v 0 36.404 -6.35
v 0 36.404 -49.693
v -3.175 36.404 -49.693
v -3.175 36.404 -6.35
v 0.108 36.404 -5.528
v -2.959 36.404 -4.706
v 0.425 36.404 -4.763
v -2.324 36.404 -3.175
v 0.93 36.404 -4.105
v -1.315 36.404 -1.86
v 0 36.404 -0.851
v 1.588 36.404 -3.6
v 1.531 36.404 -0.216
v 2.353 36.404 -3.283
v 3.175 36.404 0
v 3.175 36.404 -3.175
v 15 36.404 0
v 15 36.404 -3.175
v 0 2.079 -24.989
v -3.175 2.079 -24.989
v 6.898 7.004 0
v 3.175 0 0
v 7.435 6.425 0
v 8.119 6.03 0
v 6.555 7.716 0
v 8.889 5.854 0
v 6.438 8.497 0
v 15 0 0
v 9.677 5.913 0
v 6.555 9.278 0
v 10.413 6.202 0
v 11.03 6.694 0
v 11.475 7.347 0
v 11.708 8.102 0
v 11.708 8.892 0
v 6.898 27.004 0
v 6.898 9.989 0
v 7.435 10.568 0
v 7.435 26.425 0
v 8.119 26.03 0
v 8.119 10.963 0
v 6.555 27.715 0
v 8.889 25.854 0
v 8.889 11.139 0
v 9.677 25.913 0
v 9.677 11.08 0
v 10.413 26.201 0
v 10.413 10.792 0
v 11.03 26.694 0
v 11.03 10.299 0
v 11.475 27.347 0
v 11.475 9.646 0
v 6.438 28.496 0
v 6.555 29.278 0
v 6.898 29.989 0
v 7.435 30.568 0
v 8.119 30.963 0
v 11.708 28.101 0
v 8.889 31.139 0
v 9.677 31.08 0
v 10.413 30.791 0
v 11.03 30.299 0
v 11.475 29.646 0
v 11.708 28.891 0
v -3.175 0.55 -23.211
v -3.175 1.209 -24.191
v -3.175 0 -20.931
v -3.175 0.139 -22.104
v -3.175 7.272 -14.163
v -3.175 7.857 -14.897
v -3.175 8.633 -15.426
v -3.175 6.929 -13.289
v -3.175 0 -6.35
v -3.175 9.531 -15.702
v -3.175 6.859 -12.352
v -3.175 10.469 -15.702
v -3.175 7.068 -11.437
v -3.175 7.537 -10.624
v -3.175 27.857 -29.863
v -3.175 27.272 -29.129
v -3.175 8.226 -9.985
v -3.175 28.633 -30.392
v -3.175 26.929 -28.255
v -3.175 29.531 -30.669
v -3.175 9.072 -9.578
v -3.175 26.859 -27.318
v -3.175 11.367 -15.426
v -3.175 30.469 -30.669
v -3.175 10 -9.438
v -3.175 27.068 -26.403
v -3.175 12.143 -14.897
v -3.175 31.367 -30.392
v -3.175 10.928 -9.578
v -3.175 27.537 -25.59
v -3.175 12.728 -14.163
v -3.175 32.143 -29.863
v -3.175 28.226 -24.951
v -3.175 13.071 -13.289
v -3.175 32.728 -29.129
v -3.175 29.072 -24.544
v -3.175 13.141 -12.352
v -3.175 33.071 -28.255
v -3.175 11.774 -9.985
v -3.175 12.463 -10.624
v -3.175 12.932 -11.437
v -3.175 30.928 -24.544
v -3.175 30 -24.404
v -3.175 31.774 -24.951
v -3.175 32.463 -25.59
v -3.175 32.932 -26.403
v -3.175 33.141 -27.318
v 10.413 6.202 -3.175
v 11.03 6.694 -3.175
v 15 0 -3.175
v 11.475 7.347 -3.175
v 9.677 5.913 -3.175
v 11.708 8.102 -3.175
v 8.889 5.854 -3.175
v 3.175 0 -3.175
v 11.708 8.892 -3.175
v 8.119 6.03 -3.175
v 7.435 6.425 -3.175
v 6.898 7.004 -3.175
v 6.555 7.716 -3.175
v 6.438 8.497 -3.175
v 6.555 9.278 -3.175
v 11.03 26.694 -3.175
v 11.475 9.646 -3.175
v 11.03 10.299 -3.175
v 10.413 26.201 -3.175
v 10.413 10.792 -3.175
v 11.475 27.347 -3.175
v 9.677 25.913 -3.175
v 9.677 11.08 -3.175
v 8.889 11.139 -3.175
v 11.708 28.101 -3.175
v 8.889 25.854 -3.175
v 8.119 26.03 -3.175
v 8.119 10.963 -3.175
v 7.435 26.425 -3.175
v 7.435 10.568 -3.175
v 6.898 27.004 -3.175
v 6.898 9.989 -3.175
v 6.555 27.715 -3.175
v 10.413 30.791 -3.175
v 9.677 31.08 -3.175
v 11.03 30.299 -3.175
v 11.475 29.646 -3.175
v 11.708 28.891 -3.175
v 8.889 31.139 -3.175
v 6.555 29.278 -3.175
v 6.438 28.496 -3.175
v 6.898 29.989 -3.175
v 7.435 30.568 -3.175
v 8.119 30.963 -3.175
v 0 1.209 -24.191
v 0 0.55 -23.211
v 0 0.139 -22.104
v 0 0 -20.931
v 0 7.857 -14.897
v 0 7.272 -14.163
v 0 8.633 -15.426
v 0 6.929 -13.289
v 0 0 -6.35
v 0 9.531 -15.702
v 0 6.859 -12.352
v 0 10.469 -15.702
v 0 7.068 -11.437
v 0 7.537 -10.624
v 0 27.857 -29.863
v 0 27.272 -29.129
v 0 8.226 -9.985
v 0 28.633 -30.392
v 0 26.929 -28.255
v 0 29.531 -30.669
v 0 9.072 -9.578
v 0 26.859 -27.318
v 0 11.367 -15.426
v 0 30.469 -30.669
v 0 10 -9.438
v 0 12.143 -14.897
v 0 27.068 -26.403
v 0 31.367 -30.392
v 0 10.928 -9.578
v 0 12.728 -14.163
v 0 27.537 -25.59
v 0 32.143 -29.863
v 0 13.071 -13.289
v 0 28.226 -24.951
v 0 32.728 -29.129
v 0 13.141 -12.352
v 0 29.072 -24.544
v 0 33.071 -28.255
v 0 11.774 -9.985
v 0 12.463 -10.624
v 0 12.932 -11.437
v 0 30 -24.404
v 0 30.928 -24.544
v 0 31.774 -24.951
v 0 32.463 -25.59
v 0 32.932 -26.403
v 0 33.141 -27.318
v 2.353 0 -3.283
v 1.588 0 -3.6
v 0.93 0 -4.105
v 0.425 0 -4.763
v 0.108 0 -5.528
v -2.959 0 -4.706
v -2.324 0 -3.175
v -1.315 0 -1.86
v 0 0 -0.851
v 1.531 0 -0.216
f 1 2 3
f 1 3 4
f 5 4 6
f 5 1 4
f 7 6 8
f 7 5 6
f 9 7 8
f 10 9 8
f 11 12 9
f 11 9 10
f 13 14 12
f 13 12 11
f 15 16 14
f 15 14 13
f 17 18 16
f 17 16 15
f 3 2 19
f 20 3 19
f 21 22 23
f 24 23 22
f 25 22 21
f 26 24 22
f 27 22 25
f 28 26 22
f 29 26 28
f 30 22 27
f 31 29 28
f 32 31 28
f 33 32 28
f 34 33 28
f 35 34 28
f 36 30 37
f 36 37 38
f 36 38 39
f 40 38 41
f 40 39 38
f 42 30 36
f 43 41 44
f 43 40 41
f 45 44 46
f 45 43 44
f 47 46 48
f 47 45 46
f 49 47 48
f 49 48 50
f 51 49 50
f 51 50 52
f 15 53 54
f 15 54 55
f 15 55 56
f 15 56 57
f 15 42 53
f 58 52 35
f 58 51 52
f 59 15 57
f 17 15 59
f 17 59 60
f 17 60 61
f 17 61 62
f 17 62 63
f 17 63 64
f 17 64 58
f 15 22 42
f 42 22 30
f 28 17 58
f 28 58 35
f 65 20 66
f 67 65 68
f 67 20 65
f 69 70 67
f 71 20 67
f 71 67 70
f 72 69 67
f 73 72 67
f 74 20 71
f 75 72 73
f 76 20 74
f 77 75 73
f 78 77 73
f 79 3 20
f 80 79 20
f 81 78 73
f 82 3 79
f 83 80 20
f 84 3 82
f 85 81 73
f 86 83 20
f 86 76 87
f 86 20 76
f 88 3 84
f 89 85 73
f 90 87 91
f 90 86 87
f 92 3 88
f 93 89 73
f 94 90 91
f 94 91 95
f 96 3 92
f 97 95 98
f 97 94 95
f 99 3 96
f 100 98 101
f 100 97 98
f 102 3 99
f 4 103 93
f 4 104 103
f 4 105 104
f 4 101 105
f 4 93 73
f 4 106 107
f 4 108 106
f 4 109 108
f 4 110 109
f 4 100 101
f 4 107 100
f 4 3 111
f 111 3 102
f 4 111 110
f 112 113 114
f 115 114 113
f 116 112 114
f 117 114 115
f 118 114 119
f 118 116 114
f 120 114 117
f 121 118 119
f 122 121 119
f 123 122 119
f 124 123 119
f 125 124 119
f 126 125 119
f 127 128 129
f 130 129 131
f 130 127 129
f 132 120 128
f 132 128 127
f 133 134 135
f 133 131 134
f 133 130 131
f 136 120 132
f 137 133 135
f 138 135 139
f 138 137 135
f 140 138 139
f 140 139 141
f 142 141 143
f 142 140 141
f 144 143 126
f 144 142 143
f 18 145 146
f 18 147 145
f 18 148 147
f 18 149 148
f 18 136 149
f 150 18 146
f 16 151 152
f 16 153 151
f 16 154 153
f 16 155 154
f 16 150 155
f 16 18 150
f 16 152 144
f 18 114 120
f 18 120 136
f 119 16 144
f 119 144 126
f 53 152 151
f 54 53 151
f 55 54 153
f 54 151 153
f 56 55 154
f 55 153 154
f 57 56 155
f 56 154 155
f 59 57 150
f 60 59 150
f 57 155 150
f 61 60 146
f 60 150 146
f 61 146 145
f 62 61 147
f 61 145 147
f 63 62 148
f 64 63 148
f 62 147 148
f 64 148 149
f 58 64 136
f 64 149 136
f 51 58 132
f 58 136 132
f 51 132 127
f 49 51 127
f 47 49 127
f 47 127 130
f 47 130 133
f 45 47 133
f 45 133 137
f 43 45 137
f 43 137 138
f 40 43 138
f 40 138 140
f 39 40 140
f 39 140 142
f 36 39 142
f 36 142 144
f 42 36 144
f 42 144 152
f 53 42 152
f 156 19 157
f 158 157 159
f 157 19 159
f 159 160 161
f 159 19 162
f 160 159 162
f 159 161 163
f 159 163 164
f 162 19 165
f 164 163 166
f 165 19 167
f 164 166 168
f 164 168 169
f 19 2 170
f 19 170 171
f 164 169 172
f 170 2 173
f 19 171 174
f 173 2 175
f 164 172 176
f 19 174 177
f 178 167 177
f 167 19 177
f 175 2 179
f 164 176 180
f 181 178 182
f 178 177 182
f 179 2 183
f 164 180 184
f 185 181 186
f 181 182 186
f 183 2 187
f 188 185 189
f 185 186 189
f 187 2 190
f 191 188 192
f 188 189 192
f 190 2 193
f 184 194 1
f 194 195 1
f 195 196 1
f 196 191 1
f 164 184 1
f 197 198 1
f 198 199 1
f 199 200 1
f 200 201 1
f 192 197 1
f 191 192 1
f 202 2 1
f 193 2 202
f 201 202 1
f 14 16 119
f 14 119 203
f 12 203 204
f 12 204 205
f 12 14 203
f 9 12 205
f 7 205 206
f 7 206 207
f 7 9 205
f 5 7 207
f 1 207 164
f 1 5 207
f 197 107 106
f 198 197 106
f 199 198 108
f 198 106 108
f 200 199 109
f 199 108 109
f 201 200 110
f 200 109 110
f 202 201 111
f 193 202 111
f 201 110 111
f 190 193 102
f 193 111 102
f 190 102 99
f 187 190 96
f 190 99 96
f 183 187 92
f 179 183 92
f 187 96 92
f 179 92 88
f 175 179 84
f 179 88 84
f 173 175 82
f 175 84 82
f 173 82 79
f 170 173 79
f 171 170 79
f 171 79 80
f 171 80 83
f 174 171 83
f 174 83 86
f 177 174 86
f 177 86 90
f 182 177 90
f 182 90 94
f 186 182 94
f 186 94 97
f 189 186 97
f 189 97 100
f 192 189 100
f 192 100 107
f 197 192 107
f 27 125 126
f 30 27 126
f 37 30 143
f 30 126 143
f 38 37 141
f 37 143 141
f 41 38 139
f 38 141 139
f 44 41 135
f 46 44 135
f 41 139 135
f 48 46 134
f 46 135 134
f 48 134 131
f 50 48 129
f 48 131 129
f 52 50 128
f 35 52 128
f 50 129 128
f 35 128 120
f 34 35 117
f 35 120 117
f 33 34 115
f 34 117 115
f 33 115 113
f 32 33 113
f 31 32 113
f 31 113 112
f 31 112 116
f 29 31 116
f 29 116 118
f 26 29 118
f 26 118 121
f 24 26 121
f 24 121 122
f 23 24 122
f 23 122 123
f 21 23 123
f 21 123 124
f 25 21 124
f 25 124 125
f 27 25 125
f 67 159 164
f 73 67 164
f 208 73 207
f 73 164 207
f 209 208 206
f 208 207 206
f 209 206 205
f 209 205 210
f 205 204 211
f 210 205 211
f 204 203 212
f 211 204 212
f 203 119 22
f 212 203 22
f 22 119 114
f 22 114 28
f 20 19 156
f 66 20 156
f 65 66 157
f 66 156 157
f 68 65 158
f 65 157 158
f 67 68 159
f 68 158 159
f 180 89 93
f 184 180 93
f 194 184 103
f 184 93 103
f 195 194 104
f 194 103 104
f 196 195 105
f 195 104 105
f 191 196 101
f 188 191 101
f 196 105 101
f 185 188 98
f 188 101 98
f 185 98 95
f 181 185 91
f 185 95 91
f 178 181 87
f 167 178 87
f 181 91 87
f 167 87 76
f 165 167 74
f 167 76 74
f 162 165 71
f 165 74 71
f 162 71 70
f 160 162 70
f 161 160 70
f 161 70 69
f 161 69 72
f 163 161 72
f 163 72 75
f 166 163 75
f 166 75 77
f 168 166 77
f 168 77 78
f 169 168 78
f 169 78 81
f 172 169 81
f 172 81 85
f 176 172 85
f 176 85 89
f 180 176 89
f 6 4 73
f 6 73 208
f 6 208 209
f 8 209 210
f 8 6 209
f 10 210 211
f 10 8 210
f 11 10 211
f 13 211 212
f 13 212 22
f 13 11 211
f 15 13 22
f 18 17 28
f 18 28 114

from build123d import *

# Parameters (mm, degrees)
BASE_FLANGE1_DEPTH           = 3.175
SKETCH7_R                    = 3.15
CUT_EXTRUDE3_DEPTH           = 10
EDGE_FLANGE1_STRIP_W         = 19.05
EDGE_FLANGE1_STRIP_H         = 3.175
EDGE_FLANGE1_STRIP_CUT_DEPTH = 36.40397533
EDGE_FLANGE1_DEPTH           = 36.40397533
SKETCH12_R                   = 2.65
CUT_EXTRUDE4_DEPTH           = 10


# Sheet-metal steps are written as plain solids
with BuildPart() as part:
    # Sketch2 → Base-Flange1 (new body)
    with BuildSketch(Plane(origin=(0, 0, 0), x_dir=(0, 0, -1), z_dir=(1, 0, 0))):
        with BuildLine():
            Line((0, 0), (0, 36.40397533))
            Line((0, 36.40397533), (49.693245392, 36.40397533))
            Line((49.693245392, 36.40397533), (24.989293369, 2.07924376))
            ThreePointArc((24.989293369, 2.07924376), (23.211005522, 0.550068473), (20.931069251, 0))
            Line((20.931069251, 0), (0, 0))
        make_face()
    extrude(amount=-BASE_FLANGE1_DEPTH)

    # Sketch7 → Cut-Extrude3 (cut)
    with BuildSketch(Plane.ZY.offset(3.175)):
        with Locations((-27.553898694, 30)):
            Circle(SKETCH7_R)
        with Locations((-12.587671369, 10)):
            Circle(SKETCH7_R)
    extrude(amount=-CUT_EXTRUDE3_DEPTH, mode=Mode.SUBTRACT)

    # Edge-Flange1 strip (across the edge) → Edge-Flange1 strip cut (cut)
    with BuildSketch(Plane(origin=(0, 36.40397533, 0), x_dir=(0, 0, -1), z_dir=(0, -1, 0))):
        with Locations((-3.175, -1.5875)):
            Rectangle(EDGE_FLANGE1_STRIP_W, EDGE_FLANGE1_STRIP_H)
    extrude(amount=EDGE_FLANGE1_STRIP_CUT_DEPTH, mode=Mode.SUBTRACT)

    # Edge-Flange1 section (across the edge) → Edge-Flange1 (add)
    with BuildSketch(Plane(origin=(0, 36.40397533, 0), x_dir=(0, 0, -1), z_dir=(0, -1, 0))):
        with BuildLine():
            Line((0, 3.175), (0, 15))
            Line((0, 15), (3.175, 15))
            Line((3.175, 15), (3.175, 3.175))
            ThreePointArc((3.175, 3.175), (4.10493597, 0.92993597), (6.35, 0))
            Line((6.35, 0), (6.35, -3.175))
            ThreePointArc((6.35, -3.175), (1.859871939, -1.315128061), (0, 3.175))
        make_face()
    extrude(amount=EDGE_FLANGE1_DEPTH)

    # Sketch12 → Cut-Extrude4 (cut)
    with BuildSketch(Plane(origin=(0, 0, -3.175), x_dir=(-1, 0, 0), z_dir=(0, 0, -1))):
        with Locations((-9.0875, 28.496416241)):
            Circle(SKETCH12_R)
        with Locations((-9.0875, 8.49661674)):
            Circle(SKETCH12_R)
    extrude(amount=-CUT_EXTRUDE4_DEPTH, mode=Mode.SUBTRACT)


solid = part.part
